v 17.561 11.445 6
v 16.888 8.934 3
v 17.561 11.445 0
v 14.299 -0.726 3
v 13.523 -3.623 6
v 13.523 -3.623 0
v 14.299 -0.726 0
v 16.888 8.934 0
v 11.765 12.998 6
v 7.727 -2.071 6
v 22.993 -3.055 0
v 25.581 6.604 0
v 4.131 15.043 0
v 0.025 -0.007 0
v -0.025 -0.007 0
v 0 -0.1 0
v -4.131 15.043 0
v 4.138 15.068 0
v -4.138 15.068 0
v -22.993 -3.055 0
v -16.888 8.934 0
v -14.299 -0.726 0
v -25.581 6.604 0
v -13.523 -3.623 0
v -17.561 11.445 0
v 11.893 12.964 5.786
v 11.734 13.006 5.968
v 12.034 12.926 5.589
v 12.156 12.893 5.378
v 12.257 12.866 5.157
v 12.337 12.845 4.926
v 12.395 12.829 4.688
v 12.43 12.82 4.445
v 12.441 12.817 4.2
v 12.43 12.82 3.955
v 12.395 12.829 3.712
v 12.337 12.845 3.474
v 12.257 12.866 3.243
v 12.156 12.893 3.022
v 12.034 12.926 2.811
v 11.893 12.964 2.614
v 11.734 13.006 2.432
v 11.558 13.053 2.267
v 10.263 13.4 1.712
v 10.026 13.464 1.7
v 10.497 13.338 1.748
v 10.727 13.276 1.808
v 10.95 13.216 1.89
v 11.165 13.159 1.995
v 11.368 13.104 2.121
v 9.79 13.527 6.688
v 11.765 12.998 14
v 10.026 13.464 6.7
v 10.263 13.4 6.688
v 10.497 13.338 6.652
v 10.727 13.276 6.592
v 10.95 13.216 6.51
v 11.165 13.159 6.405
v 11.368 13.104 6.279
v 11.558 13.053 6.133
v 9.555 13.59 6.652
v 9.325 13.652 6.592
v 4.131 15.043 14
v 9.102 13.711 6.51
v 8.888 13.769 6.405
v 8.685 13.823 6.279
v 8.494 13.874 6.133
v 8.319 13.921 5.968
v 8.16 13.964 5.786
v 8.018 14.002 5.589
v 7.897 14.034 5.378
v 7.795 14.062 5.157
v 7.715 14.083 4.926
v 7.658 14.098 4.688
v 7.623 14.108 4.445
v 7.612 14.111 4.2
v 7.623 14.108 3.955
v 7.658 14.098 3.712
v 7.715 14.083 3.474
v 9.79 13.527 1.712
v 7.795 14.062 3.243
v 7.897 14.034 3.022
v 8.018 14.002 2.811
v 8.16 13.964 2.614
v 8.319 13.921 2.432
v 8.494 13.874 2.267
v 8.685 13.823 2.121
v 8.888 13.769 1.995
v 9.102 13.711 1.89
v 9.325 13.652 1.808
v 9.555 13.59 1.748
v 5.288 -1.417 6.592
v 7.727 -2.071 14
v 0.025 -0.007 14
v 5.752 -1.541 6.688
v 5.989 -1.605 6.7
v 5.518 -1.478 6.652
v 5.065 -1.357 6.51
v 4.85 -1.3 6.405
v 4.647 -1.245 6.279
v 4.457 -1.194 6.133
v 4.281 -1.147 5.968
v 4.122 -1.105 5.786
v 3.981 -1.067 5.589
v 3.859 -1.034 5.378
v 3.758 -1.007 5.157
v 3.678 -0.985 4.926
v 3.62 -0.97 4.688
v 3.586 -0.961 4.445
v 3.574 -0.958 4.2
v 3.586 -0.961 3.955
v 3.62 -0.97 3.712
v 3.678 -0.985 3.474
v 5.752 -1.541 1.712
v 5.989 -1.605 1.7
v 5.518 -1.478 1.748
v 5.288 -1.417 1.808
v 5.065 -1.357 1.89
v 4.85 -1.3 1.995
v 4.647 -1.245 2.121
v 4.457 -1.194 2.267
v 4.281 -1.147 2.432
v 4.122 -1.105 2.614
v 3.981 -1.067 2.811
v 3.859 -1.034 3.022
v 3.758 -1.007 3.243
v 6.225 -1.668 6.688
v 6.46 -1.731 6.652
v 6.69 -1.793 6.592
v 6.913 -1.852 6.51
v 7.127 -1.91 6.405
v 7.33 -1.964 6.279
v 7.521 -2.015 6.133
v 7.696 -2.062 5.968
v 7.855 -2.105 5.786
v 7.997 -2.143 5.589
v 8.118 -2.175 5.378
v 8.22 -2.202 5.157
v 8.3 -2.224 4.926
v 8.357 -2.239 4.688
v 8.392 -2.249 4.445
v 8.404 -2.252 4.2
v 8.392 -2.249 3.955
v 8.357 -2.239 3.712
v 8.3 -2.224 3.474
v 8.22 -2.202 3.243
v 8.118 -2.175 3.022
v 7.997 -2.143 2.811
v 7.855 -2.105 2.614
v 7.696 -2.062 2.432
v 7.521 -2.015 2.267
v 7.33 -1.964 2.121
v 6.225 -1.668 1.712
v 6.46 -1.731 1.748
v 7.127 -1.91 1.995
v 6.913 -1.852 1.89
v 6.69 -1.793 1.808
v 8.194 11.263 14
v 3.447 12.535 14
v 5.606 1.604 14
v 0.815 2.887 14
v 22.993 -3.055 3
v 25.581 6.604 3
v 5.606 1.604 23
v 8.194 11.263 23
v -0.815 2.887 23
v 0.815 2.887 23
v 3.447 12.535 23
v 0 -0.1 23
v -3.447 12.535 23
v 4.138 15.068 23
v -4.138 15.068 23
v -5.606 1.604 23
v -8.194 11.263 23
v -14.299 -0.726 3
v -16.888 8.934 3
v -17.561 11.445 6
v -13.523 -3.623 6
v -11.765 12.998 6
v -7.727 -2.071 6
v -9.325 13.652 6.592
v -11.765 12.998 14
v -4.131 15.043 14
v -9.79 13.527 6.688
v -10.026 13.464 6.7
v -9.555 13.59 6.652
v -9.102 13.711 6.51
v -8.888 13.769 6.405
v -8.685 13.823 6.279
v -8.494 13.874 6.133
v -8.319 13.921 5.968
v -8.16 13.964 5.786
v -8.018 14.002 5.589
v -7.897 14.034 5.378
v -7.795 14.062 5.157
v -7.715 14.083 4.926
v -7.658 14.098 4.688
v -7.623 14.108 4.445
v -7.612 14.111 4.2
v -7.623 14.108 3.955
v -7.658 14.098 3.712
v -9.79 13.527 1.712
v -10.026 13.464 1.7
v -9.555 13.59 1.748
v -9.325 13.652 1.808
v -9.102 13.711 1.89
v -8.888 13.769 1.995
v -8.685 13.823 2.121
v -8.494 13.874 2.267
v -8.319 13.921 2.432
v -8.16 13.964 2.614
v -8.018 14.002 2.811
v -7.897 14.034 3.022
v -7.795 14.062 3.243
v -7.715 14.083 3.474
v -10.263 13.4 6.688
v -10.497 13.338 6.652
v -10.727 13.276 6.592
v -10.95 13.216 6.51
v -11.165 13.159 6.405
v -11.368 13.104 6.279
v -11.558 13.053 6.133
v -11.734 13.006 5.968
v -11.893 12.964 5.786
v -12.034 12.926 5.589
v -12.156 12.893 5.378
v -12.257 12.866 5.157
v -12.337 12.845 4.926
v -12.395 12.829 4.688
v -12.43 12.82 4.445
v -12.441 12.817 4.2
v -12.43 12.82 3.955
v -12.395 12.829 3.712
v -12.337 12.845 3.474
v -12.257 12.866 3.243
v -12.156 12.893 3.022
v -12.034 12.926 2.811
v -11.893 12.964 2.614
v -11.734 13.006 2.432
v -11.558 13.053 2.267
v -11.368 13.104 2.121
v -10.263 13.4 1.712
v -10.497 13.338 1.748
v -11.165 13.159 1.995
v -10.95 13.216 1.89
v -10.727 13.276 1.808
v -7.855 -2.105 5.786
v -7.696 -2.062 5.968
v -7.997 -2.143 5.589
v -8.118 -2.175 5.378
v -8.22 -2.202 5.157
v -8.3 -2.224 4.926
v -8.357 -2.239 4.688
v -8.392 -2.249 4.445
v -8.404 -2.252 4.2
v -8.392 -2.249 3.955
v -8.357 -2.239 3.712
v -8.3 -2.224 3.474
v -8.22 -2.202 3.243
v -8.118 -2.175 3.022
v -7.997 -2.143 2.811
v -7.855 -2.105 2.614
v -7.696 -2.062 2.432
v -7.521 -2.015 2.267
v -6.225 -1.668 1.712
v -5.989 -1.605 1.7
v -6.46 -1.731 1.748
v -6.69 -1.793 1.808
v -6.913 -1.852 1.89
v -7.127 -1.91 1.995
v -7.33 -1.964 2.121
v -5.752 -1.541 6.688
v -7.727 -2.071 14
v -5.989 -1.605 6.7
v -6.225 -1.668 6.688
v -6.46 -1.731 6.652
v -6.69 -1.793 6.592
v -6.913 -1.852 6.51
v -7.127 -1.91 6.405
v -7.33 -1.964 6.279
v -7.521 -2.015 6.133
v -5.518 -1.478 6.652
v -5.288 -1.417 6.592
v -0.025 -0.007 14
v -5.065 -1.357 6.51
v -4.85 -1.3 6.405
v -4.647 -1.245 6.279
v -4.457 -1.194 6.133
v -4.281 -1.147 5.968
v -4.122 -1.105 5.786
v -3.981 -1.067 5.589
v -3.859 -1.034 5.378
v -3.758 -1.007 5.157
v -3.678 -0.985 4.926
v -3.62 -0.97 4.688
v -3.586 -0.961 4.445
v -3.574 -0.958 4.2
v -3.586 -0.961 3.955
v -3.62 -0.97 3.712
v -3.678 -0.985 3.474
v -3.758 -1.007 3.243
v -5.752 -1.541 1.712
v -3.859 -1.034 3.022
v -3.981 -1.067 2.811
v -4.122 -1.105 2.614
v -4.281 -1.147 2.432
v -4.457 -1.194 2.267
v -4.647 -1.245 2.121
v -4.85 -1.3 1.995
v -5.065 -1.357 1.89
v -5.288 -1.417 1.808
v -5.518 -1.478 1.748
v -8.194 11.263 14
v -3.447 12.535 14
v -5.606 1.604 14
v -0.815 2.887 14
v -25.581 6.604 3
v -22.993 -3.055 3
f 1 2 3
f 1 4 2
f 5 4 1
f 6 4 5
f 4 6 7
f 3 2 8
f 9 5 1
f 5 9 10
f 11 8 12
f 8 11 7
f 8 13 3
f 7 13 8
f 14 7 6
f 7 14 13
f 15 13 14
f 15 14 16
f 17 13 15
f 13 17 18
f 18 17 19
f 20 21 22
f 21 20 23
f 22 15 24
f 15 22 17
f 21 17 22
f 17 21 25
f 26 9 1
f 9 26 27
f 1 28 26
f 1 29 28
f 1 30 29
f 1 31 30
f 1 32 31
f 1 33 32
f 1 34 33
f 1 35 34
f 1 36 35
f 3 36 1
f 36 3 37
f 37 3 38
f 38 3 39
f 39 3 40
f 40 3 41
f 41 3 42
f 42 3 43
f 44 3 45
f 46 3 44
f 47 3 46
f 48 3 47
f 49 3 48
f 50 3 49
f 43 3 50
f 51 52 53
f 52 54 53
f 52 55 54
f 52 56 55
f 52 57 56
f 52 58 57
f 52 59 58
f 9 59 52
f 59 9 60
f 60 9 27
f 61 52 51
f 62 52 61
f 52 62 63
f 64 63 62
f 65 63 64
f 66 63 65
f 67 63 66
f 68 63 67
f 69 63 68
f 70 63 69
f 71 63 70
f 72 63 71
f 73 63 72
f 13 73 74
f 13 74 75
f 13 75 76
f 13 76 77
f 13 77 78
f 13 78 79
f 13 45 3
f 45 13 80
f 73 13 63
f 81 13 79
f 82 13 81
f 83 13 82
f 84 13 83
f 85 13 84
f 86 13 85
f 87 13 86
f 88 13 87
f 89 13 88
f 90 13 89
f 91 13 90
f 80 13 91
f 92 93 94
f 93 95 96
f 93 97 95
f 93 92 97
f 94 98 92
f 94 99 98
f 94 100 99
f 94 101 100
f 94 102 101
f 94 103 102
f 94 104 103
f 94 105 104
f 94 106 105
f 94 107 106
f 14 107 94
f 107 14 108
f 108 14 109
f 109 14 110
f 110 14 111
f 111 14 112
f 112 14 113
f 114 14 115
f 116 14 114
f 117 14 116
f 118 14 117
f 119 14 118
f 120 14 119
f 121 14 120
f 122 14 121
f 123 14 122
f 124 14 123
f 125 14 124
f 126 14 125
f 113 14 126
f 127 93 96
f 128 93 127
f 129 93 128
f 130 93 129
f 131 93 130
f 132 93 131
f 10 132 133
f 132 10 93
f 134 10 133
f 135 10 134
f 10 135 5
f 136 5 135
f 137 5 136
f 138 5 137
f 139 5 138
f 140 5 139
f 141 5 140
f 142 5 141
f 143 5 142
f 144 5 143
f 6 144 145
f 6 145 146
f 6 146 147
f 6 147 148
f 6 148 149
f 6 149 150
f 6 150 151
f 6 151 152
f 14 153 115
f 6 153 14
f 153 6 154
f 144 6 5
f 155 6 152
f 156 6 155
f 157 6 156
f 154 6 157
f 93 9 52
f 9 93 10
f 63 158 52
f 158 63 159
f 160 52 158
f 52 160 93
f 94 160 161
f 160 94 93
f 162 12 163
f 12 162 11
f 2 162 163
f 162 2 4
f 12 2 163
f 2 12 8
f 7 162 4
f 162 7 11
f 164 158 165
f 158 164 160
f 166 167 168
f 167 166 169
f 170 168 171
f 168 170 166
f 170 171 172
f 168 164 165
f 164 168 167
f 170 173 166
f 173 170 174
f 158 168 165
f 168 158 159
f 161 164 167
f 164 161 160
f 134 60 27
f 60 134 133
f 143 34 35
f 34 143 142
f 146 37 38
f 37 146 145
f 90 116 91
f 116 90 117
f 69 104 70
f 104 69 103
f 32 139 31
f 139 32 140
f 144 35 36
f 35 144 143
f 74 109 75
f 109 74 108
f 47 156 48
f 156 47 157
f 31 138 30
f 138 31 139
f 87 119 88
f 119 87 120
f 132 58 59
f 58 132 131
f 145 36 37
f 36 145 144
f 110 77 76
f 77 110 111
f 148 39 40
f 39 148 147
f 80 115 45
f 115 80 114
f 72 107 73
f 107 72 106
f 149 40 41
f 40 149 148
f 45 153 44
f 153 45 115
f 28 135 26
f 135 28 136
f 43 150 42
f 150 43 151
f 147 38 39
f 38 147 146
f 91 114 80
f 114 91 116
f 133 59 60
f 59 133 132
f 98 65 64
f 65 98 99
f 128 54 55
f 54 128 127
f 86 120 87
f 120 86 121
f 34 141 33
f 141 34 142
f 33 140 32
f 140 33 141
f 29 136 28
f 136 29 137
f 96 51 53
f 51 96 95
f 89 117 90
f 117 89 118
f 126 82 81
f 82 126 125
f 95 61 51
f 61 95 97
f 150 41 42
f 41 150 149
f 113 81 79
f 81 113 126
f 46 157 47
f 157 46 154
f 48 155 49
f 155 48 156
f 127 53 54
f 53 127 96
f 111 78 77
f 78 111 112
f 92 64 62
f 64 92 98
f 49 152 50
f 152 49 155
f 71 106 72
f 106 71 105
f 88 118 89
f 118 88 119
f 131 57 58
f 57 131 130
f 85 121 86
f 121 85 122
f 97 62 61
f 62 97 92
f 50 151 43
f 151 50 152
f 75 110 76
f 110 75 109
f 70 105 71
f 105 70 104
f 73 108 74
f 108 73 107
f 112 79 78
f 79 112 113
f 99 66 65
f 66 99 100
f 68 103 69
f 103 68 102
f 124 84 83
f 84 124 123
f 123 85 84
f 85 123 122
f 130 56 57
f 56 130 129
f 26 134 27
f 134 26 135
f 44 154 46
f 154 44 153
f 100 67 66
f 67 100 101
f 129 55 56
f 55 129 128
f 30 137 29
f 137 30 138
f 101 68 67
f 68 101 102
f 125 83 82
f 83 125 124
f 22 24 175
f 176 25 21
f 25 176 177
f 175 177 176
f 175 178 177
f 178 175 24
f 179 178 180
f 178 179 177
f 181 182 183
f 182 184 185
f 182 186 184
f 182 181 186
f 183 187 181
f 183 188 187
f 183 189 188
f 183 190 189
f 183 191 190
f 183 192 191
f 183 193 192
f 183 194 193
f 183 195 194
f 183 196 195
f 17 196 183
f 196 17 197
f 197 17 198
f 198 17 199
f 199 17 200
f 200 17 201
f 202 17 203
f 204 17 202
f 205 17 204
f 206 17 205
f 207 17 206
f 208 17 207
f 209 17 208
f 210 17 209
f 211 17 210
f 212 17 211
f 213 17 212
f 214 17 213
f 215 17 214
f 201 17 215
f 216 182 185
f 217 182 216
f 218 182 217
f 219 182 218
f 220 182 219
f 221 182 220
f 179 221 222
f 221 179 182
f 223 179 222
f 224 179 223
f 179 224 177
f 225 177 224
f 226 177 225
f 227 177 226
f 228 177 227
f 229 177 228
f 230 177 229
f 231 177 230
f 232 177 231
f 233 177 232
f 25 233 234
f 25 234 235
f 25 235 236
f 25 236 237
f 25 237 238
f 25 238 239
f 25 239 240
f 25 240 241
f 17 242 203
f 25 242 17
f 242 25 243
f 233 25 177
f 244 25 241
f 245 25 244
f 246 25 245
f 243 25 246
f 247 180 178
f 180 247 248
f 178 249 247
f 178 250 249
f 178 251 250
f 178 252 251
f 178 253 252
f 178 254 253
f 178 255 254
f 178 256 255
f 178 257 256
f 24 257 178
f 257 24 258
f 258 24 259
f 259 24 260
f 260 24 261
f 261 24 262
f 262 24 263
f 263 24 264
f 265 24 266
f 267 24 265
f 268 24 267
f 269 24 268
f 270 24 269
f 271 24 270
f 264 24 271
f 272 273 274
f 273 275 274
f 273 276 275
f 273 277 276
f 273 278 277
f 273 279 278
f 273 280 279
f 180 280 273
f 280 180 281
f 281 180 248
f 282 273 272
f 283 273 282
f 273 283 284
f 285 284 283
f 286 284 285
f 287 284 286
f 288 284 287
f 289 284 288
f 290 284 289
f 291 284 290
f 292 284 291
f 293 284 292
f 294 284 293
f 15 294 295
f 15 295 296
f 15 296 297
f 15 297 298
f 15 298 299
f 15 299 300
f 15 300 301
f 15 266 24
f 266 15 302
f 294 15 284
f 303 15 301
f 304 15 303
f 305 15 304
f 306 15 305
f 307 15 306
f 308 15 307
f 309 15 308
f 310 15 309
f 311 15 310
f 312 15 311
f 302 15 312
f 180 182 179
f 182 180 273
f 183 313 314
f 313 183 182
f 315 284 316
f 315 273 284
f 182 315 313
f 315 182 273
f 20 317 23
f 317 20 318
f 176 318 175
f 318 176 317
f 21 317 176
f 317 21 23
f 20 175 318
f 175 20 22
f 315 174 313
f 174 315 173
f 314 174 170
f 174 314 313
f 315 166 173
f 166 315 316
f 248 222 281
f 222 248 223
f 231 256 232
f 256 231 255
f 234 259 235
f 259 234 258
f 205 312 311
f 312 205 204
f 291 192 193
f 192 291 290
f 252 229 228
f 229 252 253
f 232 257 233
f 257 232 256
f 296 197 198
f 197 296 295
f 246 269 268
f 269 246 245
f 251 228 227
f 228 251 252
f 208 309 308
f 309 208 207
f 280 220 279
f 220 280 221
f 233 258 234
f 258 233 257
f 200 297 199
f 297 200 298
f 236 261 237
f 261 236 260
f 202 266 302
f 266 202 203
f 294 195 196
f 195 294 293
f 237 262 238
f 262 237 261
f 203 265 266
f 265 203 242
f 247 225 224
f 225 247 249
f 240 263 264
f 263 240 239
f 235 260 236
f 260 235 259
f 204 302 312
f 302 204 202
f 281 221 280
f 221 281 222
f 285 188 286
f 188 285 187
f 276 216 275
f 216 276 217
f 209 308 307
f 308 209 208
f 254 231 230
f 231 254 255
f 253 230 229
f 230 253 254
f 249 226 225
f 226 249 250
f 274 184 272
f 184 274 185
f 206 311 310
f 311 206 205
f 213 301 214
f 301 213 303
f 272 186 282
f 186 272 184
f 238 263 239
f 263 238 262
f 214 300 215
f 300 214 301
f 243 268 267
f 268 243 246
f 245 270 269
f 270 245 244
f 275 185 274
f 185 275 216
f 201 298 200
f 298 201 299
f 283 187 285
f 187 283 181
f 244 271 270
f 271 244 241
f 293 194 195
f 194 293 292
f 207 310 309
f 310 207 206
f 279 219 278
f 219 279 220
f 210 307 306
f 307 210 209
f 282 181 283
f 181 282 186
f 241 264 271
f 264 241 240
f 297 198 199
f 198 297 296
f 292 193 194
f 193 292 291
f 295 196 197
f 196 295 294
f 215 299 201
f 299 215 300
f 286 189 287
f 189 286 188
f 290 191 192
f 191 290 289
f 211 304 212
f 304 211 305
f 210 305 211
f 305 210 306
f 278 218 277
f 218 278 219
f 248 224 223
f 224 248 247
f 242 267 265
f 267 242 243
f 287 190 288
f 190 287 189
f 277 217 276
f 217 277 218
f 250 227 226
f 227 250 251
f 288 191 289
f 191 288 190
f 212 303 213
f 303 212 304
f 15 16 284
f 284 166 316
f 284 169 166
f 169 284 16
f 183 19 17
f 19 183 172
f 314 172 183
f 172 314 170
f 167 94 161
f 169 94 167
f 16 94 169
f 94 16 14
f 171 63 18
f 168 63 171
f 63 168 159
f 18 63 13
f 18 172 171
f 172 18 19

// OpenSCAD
// file: onecorner.scad
use <../threads/isothreads.scad>


$fn=0;

fullwidth=15.6;
narrolength=23;

// Functions to pass variables up to user of this module
function fanwidth()=fullwidth;
function tablength()=narrolength;

function segments (diameter) = min (($fn < 0.01) ? 50 : 2, ceil (diameter*6));

module frame(padding)
{
    fullthick=6.0;
    fulllength=14;
    narrothick=3;
    narrowidth=10;
    
    cube([fulllength,fullwidth,fullthick],center=false);
    cube([fullthick+padding,fullwidth,fulllength],center=false);
    
    translate([0,3,0])cube([narrolength,narrowidth,narrothick],center=false);
    translate([0,3,0])cube([narrothick+padding,narrowidth,narrolength],center=false);
}

module onecorner(padding=0,thread=false)
{
    holecenter=4.2;
    
    difference()
    {
        frame(padding);
        translate([holecenter+padding,0,holecenter])rotate([-90,0,0])
            if (thread)           
                {m4thread();}
            else
                {m4hole();}
    }
}


module m4hole()
{
    $fn=64;
    height=20;
    translate([0,0,height/2])cylinder(d=5,h=height,center=true);
}

module m4thread()
{
    height=20;
    translate([0,0,0])metric_thread (diameter=8, pitch=1, length=height);   
}

onecorner(3);
//m4thread();
//m4hole();
// main file
use <onecorner.scad>


module prism(l, w, h) {
       polyhedron(points=[
               [0,0,h],           // 0    front top corner
               [-w,0,0],[w,0,0],   // 1, 2 front left & right bottom corners
               [0,l,h],           // 3    back top corner
               [-w,l,0],[w,l,0]    // 4, 5 back left & right bottom corners
       ], faces=[ // points for all faces must be ordered clockwise when looking in
               [0,2,1],    // top face
               [3,4,5],    // base face
               [0,1,4,3],  // h face
               [1,2,5,4],  // w face
               [0,3,5,2],  // hypotenuse face
       ]);
}


module twocorner(angle=0)
{

    offset=2;
    rotate([0,0,-angle/2])onecorner(offset);
    rotate([0,0,angle/2])mirror([1,0,0])onecorner(offset);

    if (angle > 0)
    {       
        translate([0,cos(angle/2)*fanwidth(),0])rotate([90,0,0])prism(tablength(),sin(angle/2)*fanwidth()+0.1,cos(angle/2)*fanwidth()+0.1);
    }
}

twocorner(30);
